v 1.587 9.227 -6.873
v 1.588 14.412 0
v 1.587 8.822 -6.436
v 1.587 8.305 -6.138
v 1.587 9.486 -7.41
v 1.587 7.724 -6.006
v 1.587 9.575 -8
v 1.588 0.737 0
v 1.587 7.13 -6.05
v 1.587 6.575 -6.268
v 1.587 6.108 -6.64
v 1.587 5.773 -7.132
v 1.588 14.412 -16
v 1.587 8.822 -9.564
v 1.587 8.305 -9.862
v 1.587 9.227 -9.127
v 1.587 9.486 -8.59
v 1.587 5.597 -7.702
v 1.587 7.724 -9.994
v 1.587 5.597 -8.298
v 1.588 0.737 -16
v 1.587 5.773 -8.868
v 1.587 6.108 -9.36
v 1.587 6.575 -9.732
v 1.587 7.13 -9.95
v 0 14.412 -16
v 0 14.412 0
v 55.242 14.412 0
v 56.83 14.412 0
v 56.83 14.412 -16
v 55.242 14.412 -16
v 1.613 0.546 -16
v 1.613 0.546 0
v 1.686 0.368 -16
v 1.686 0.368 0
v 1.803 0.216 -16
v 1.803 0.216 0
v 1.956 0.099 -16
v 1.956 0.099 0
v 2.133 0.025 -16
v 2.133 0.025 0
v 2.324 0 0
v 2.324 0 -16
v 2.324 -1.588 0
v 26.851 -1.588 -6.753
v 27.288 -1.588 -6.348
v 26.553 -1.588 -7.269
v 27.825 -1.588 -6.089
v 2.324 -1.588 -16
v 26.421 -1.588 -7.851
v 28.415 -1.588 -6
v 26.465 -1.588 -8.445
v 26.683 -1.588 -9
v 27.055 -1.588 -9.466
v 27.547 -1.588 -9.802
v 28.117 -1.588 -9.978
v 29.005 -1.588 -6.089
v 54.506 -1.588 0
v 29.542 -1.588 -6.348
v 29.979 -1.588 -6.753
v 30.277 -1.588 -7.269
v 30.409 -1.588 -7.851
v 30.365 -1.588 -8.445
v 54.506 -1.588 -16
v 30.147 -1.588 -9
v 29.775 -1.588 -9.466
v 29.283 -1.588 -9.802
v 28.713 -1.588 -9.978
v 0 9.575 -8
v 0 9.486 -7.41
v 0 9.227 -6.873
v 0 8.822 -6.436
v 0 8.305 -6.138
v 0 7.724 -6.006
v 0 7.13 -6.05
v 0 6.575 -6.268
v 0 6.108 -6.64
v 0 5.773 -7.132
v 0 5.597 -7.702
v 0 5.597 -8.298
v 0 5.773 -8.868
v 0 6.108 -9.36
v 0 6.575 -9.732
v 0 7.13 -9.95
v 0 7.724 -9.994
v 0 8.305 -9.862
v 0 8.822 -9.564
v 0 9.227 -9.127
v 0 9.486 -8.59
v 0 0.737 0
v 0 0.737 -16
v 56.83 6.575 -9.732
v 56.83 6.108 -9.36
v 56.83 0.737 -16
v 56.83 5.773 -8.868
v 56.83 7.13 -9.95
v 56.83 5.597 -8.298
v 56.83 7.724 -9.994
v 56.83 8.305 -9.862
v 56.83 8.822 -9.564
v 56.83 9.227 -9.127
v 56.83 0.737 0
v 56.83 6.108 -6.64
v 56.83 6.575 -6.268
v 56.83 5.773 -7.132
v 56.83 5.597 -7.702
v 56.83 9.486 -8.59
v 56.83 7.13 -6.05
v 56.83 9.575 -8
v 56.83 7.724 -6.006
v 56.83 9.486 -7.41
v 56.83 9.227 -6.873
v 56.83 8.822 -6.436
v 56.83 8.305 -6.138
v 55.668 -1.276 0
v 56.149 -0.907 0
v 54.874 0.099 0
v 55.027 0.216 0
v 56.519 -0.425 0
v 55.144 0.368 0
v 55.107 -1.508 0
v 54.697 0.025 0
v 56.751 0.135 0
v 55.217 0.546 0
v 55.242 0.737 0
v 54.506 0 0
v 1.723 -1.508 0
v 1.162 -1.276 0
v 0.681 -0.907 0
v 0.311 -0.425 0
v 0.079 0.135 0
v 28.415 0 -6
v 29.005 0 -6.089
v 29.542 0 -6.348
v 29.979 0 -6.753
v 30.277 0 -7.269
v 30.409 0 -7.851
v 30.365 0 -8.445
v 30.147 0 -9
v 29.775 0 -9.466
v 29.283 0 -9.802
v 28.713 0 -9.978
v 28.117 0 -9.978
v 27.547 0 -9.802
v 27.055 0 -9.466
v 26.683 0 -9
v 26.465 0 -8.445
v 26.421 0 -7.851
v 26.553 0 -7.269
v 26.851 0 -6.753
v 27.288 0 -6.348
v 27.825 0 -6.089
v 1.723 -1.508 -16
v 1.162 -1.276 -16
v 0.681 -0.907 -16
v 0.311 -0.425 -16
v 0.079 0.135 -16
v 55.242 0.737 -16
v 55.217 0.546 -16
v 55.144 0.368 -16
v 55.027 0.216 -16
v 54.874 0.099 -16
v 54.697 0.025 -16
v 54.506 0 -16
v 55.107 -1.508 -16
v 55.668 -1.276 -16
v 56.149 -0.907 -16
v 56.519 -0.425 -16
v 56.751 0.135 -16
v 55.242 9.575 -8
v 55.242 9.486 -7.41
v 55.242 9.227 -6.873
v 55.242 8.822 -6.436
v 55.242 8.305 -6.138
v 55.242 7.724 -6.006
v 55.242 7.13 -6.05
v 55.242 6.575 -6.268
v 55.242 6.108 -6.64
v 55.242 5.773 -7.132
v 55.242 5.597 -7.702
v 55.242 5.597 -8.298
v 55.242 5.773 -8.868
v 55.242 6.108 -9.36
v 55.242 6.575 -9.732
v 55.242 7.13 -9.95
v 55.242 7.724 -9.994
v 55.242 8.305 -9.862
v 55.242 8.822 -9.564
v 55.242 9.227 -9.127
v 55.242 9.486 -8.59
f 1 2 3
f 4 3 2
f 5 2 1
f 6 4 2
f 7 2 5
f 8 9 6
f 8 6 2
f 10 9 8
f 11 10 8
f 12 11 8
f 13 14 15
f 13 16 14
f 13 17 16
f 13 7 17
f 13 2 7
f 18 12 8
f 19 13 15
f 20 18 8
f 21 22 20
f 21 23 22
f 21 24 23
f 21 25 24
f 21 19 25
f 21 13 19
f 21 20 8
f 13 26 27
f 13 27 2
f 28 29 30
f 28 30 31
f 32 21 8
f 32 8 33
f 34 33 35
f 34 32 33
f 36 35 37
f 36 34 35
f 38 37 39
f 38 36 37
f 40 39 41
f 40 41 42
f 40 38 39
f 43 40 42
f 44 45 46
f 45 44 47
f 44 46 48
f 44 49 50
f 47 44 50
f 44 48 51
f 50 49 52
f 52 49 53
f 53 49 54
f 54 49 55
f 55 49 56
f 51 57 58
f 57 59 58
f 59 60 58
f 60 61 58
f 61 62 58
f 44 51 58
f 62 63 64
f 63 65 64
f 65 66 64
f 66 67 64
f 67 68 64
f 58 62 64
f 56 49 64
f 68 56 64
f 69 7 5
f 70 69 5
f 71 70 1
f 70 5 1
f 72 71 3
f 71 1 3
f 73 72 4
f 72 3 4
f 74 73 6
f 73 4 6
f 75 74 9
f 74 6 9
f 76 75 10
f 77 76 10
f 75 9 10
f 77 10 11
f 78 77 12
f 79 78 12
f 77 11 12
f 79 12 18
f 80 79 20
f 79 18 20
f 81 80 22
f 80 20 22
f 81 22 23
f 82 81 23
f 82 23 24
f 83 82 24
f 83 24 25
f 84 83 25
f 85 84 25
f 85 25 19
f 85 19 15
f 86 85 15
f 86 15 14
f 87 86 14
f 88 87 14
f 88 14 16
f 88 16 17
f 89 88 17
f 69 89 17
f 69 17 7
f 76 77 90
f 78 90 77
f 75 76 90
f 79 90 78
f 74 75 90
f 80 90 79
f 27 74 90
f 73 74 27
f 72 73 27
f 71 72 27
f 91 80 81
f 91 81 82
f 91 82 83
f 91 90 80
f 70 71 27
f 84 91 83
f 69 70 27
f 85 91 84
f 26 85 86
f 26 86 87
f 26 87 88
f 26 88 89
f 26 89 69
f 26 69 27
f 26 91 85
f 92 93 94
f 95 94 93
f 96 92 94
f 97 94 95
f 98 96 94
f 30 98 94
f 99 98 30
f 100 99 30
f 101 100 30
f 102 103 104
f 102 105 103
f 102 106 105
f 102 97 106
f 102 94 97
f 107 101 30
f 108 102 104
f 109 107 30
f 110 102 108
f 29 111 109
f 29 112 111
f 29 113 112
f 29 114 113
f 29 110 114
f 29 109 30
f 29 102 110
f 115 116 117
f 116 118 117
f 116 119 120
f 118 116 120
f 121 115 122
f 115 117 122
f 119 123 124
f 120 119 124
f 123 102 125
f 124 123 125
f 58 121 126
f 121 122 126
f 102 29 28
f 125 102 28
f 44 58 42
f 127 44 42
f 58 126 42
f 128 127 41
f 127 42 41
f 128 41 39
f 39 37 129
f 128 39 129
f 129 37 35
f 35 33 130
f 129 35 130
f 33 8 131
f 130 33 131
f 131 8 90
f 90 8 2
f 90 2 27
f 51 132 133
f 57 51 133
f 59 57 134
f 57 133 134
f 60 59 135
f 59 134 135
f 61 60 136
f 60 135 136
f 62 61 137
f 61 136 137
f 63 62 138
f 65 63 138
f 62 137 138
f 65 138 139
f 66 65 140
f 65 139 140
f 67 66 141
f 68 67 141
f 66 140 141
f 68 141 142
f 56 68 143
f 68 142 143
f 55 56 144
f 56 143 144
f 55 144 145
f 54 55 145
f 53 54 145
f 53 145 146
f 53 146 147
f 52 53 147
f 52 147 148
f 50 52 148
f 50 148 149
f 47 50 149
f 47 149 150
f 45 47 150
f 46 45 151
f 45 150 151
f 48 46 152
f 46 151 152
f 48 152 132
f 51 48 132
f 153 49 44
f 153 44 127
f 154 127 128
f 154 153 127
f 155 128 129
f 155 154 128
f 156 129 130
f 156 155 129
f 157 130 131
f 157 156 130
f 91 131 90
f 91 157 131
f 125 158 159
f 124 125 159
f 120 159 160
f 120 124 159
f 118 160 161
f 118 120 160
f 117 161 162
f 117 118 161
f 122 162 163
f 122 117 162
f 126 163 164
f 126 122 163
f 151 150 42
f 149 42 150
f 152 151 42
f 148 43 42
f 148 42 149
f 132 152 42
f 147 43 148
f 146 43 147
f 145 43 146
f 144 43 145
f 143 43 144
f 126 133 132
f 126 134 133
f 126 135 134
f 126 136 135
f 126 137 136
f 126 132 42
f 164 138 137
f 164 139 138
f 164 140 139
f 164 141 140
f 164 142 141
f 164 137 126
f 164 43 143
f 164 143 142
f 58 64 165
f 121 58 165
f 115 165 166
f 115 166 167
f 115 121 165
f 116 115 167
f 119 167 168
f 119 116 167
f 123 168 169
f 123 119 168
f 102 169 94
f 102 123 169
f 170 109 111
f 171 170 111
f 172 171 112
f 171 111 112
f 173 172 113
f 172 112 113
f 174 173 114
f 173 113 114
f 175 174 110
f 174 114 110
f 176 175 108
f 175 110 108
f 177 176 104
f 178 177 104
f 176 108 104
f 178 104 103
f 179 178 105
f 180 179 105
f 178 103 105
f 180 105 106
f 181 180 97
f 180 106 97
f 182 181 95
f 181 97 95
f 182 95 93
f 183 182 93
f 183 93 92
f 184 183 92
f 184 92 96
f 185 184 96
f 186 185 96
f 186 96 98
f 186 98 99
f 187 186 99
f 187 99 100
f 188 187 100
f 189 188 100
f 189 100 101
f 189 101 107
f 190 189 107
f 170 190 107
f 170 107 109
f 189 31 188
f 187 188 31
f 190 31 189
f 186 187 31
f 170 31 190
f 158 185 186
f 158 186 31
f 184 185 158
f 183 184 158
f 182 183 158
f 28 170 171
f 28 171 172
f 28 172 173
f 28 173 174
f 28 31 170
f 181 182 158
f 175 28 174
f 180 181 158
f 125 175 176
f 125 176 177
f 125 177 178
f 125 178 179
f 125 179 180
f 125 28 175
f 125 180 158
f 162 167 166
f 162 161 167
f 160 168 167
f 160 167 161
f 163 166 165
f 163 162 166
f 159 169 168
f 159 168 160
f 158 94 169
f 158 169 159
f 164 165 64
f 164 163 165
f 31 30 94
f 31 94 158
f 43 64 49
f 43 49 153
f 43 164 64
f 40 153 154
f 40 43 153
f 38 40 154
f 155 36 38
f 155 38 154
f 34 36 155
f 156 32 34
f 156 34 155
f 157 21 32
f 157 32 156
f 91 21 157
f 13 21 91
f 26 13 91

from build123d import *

# Parameters (mm, degrees)
SKETCH1_W                      = 56.83
SKETCH1_H                      = 16
SKETCH1_R                      = 2
BASE_FLANGE1_DEPTH             = 1.5875
EDGE_FLANGE1_STRIP_W           = 7.8232
EDGE_FLANGE1_STRIP_H           = 1.5875
EDGE_FLANGE1_STRIP_CUT_DEPTH   = 16
EDGE_FLANGE1_STRIP_2_W         = 7.8232
EDGE_FLANGE1_STRIP_2_H         = 1.5875
EDGE_FLANGE1_STRIP_CUT_2_DEPTH = 16
EDGE_FLANGE1_DEPTH             = 16
EDGE_FLANGE1_BEND_DEPTH        = 16
SKETCH12_R                     = 2
CUT_EXTRUDE1_DEPTH             = 61.773094839


# Sheet-metal steps are written as plain solids
with BuildPart() as part:
    # Sketch1 → Base-Flange1 (new body)
    with BuildSketch(Plane(origin=(0, 0, 0), x_dir=(1, 0, 0), z_dir=(0, 1, 0))):
        with Locations((28.415, 8)):
            Rectangle(SKETCH1_W, SKETCH1_H)
        with Locations(Location((28.415, 8, 0), (0, 0, 270))):
            Circle(SKETCH1_R, mode=Mode.SUBTRACT)
    extrude(amount=-BASE_FLANGE1_DEPTH)

    # Edge-Flange1 strip (across the edge) → Edge-Flange1 strip cut (cut)
    with BuildSketch(Plane(origin=(56.83, 0, 0), x_dir=(-1, 0, 0), z_dir=(0, 0, -1))):
        with Locations((-1.5875, -0.79375)):
            Rectangle(EDGE_FLANGE1_STRIP_W, EDGE_FLANGE1_STRIP_H)
    extrude(amount=EDGE_FLANGE1_STRIP_CUT_DEPTH, mode=Mode.SUBTRACT)

    # Edge-Flange1 strip 2 (across the edge) → Edge-Flange1 strip cut 2 (cut)
    with BuildSketch(Plane.XY.offset(-16)):
        with Locations((-1.5875, -0.79375)):
            Rectangle(EDGE_FLANGE1_STRIP_2_W, EDGE_FLANGE1_STRIP_2_H)
    extrude(amount=EDGE_FLANGE1_STRIP_CUT_2_DEPTH, mode=Mode.SUBTRACT)

    # Edge-Flange1 section (across the edge) → Edge-Flange1 (add)
    with BuildSketch(Plane(origin=(56.83, 0, 0), x_dir=(-1, 0, 0), z_dir=(0, 0, -1))):
        with BuildLine():
            Line((0, 0.7366), (0, 14.4125))
            Line((0, 14.4125), (1.5875, 14.4125))
            Line((1.5875, 14.4125), (1.5875, 0.7366))
            ThreePointArc((1.5875, 0.7366), (1.803245145, 0.215745145), (2.3241, 0))
            Line((2.3241, 0), (2.3241, -1.5875))
            ThreePointArc((2.3241, -1.5875), (0.68071313, -0.90678687), (0, 0.7366))
        make_face()
    extrude(amount=EDGE_FLANGE1_DEPTH)

    # Edge-Flange1 section 2 (across the edge) → Edge-Flange1 bend (add)
    with BuildSketch(Plane.XY.offset(-16)):
        with BuildLine():
            Line((0, 0.7366), (0, 14.4125))
            Line((0, 14.4125), (1.5875, 14.4125))
            Line((1.5875, 14.4125), (1.5875, 0.7366))
            ThreePointArc((1.5875, 0.7366), (1.803245145, 0.215745145), (2.3241, 0))
            Line((2.3241, 0), (2.3241, -1.5875))
            ThreePointArc((2.3241, -1.5875), (0.68071313, -0.90678687), (0, 0.7366))
        make_face()
    extrude(amount=EDGE_FLANGE1_BEND_DEPTH)

    # Sketch12 → Cut-Extrude1 (cut, through all)
    with BuildSketch(Plane(origin=(56.83, 0, 0), x_dir=(0, 0, -1), z_dir=(1, 0, 0))):
        with Locations(Location((8, 7.57455, 0), (0, 0, 90))):
            Circle(SKETCH12_R)
    extrude(amount=-CUT_EXTRUDE1_DEPTH, mode=Mode.SUBTRACT)


solid = part.part
